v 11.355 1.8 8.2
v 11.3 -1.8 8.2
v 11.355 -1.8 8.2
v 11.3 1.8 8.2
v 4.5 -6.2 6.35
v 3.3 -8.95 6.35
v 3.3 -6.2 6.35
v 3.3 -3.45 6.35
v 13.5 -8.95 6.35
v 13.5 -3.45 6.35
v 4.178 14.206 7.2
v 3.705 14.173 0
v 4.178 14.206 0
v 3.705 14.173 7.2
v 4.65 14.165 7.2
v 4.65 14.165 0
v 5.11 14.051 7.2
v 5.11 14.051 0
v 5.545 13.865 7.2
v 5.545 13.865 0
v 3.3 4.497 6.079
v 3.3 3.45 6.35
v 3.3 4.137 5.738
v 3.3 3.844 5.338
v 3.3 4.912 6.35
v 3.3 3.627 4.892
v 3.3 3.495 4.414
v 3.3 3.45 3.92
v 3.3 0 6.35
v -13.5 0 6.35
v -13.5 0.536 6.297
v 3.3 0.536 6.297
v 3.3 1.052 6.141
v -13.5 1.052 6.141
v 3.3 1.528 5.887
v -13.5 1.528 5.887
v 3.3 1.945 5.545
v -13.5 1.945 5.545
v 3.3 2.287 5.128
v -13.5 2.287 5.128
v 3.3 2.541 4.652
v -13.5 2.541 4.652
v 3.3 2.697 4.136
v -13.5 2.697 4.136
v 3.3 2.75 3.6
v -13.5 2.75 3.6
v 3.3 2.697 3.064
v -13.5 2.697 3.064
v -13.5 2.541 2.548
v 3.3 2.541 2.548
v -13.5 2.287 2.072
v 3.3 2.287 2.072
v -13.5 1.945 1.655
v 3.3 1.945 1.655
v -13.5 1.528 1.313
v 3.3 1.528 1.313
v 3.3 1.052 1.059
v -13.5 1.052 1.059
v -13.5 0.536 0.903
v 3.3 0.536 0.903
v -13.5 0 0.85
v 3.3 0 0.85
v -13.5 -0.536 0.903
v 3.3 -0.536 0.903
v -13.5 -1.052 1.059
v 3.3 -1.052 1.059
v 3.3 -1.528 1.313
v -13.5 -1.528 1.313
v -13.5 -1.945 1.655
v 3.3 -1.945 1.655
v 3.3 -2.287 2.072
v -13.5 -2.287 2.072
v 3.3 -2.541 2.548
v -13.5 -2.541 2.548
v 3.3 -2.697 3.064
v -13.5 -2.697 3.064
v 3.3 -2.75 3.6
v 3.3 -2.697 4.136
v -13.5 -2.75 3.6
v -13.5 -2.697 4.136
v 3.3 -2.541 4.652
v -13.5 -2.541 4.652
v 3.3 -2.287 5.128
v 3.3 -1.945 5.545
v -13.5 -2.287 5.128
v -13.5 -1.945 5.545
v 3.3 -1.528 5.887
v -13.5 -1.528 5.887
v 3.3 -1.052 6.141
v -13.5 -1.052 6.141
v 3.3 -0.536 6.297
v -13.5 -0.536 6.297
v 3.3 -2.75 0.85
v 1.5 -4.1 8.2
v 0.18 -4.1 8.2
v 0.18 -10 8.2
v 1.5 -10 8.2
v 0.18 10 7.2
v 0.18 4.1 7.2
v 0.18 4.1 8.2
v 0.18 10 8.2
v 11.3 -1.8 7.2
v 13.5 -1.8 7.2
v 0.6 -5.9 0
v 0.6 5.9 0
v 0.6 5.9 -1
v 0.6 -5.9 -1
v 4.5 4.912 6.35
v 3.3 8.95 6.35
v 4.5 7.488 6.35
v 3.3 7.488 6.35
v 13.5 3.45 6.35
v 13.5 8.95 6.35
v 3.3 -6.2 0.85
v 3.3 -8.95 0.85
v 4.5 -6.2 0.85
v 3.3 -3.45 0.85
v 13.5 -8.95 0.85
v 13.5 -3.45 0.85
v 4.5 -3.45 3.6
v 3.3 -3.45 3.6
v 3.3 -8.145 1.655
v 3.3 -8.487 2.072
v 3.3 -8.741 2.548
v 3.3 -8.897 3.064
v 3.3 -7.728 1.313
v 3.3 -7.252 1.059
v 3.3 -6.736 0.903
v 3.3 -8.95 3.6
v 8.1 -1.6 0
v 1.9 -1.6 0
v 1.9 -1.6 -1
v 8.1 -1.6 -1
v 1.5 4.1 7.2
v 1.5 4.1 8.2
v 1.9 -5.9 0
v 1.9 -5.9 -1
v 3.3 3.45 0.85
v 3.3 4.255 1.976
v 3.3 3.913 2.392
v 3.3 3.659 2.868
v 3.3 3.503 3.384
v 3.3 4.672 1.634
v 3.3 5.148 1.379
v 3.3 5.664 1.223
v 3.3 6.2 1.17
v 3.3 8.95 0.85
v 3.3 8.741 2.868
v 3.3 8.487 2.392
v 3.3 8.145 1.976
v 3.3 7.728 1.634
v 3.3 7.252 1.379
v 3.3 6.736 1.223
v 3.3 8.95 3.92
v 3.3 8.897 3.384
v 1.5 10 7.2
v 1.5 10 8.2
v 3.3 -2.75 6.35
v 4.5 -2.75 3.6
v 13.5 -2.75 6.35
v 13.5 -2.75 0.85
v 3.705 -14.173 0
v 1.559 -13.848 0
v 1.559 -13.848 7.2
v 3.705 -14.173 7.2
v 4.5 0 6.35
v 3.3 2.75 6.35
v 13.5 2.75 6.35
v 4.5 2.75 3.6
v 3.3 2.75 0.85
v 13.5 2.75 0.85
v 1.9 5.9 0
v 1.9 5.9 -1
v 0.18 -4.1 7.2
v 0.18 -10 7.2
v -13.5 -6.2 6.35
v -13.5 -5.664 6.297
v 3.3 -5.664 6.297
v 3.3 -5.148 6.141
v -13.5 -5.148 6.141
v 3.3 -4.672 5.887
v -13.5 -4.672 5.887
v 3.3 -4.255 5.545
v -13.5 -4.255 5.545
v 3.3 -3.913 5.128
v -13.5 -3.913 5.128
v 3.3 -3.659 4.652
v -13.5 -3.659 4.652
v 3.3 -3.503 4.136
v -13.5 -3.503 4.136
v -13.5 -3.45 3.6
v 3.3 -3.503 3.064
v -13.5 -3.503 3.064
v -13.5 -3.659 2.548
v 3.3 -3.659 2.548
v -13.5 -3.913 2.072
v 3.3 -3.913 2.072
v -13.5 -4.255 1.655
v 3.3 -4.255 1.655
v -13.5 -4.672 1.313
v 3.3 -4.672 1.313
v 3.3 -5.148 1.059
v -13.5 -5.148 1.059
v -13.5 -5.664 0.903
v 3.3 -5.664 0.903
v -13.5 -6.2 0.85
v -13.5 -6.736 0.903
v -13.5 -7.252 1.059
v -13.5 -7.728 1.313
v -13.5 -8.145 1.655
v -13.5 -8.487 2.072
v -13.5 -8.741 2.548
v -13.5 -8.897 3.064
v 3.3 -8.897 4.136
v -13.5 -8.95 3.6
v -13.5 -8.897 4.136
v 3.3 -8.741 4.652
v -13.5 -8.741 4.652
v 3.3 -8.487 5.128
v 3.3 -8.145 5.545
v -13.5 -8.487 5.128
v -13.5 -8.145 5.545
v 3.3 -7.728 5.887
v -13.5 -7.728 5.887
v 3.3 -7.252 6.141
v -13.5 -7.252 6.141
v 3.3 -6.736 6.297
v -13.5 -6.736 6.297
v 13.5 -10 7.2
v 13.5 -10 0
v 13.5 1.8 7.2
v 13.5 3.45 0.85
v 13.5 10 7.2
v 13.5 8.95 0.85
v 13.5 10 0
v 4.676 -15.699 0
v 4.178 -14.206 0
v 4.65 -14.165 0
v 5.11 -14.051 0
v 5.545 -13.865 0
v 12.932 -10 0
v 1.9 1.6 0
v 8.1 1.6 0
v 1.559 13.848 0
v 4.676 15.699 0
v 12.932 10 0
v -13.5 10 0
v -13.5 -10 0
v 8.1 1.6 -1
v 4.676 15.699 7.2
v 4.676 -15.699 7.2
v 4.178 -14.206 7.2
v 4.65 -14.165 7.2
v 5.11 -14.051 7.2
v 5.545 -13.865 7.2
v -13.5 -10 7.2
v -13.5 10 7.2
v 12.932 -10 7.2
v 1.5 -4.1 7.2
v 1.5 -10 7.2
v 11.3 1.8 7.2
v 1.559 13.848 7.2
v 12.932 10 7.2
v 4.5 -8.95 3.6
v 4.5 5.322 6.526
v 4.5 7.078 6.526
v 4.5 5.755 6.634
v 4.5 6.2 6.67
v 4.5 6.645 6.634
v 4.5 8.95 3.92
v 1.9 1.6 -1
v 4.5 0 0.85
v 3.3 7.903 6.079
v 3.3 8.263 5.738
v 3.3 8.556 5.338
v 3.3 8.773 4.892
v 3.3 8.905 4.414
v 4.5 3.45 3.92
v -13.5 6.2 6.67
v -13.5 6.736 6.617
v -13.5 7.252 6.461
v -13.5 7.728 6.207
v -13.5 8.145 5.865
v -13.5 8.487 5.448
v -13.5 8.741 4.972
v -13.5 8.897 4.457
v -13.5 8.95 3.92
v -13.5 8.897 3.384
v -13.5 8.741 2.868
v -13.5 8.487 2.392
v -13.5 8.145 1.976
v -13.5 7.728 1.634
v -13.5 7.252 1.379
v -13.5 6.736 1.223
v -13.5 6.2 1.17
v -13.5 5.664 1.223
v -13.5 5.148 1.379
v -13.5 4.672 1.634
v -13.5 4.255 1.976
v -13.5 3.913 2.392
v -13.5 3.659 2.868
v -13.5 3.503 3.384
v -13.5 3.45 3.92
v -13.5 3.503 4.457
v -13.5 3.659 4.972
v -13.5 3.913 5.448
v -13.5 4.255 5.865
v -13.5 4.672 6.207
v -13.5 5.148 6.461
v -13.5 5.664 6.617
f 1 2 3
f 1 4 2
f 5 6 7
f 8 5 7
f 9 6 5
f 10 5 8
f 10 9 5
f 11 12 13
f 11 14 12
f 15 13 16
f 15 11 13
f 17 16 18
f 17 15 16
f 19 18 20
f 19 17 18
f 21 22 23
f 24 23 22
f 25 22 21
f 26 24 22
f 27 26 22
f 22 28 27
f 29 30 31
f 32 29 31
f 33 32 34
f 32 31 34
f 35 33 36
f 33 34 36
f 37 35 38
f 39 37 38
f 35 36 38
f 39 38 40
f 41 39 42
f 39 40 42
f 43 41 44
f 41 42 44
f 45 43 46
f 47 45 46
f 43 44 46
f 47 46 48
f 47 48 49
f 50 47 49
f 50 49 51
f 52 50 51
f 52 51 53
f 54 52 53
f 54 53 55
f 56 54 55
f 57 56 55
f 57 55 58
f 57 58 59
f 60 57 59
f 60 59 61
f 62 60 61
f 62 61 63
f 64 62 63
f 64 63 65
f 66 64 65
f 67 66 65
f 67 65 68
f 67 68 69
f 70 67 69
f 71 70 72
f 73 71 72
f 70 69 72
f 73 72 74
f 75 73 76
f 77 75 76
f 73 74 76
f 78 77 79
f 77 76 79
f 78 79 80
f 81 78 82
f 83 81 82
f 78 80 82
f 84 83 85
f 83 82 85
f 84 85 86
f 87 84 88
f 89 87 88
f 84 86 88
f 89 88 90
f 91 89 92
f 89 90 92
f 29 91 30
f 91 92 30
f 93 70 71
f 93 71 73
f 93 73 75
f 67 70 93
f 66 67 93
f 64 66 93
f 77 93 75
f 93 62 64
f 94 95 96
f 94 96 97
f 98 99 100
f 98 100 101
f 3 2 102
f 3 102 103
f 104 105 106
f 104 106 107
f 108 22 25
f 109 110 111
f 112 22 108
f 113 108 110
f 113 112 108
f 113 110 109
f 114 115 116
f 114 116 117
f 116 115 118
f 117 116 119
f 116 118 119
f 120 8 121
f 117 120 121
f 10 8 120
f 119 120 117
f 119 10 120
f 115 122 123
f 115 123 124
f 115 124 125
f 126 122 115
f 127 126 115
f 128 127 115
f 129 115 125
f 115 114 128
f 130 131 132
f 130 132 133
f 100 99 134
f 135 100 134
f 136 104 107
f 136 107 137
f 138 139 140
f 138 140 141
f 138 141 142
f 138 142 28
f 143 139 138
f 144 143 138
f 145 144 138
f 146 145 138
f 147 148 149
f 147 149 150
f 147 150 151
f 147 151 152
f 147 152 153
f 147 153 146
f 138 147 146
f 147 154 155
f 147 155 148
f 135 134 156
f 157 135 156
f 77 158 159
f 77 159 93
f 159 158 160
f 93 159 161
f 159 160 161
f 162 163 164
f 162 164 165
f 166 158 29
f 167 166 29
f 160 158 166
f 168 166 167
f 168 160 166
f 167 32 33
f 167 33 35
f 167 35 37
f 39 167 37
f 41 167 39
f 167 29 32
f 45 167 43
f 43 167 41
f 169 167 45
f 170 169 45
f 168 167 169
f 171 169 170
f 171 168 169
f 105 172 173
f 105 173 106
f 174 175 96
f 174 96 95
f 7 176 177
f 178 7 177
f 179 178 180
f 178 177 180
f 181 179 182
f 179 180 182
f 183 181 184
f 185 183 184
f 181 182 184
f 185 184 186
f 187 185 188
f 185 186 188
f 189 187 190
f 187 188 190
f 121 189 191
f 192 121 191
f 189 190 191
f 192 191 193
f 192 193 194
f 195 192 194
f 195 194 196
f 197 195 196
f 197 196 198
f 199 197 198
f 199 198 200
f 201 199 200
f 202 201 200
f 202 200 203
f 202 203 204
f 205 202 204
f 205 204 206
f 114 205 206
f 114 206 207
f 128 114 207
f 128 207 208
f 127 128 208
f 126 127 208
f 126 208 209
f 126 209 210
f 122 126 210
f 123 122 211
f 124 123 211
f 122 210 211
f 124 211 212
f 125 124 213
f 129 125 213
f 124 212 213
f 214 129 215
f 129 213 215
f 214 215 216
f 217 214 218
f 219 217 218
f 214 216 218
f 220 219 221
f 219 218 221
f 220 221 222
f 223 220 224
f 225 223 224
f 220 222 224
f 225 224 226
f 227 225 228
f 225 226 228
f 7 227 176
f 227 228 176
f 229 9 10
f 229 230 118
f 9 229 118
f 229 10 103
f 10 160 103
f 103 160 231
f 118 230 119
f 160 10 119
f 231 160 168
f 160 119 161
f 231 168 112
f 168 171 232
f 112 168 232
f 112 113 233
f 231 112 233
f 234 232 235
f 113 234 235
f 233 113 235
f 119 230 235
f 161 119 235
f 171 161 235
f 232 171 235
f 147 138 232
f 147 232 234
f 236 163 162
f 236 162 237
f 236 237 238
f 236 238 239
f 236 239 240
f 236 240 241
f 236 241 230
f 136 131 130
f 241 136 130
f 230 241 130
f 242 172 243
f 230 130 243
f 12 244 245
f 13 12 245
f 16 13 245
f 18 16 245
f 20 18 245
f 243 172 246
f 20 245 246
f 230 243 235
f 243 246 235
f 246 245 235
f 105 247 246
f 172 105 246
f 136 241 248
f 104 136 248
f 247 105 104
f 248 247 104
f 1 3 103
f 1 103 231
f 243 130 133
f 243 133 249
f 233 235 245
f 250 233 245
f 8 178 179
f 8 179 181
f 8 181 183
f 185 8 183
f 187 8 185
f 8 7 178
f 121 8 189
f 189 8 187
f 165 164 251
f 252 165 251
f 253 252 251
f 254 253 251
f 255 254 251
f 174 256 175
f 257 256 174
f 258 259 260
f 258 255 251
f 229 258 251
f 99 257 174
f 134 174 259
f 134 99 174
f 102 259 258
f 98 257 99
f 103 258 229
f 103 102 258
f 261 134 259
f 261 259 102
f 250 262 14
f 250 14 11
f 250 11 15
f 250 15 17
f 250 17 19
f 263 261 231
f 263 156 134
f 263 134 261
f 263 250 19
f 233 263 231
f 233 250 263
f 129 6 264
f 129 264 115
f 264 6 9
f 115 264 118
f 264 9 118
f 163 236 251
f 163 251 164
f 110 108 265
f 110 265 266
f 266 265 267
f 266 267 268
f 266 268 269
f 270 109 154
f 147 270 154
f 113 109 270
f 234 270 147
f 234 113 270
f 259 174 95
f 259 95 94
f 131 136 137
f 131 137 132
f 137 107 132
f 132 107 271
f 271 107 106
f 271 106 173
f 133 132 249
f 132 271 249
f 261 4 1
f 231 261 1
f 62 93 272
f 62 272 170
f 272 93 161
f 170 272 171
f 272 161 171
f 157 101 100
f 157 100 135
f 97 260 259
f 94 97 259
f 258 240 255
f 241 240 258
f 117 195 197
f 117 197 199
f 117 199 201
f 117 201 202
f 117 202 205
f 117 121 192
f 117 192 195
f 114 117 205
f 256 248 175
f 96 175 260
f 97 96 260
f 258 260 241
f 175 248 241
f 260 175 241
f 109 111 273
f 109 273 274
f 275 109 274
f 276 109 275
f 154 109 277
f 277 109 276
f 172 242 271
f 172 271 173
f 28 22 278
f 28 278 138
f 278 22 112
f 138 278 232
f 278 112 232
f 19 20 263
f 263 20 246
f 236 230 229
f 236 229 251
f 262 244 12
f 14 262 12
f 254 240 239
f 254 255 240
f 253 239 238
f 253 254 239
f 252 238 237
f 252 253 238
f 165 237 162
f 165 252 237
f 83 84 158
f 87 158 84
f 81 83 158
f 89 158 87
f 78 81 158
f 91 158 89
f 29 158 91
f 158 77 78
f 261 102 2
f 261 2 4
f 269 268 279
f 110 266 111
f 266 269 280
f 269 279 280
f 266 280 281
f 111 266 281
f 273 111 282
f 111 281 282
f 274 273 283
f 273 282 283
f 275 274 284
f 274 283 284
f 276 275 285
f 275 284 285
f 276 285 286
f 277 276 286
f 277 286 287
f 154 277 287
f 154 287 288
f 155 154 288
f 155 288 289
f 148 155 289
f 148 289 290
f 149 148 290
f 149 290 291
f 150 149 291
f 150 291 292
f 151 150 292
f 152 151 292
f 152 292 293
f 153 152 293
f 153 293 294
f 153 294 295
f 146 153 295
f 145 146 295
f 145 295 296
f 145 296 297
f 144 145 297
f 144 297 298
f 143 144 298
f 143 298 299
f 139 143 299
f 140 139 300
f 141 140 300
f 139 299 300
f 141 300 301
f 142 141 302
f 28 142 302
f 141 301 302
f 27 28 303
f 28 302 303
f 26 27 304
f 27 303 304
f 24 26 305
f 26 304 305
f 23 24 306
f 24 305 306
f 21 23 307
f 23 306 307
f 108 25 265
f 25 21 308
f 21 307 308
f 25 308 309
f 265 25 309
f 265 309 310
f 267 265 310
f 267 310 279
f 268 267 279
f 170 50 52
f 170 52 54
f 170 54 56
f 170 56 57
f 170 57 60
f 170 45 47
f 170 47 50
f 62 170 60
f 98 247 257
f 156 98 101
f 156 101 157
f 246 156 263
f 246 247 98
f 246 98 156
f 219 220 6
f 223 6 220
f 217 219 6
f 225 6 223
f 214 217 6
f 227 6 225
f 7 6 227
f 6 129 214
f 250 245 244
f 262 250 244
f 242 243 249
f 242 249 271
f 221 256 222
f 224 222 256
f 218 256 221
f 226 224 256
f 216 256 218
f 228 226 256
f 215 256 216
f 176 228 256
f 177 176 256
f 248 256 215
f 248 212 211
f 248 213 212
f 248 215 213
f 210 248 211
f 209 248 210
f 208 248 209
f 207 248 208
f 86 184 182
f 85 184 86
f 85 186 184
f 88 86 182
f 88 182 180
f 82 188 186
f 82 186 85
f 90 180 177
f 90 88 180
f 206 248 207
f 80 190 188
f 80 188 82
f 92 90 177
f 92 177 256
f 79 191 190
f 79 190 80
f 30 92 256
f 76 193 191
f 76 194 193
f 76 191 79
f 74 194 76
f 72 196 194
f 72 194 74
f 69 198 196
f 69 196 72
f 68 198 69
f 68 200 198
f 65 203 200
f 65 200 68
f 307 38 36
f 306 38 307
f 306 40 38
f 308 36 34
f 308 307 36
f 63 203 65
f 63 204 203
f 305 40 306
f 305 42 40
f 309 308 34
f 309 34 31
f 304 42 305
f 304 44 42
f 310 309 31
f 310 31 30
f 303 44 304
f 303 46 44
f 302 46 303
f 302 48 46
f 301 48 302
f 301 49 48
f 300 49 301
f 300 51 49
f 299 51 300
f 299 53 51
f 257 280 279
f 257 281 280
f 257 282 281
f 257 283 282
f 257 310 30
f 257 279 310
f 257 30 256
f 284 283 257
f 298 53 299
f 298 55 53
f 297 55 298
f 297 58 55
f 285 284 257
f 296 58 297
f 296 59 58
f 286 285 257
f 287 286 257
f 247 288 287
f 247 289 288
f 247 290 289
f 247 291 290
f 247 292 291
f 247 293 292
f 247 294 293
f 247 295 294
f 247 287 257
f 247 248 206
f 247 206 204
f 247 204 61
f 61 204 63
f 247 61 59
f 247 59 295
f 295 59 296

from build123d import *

# Parameters (mm, degrees)
SKETCH_1_W          = 27
SKETCH_1_H          = 20
EXTRUDE_1_DEPTH     = 7.2
SKETCH_2_W          = 5.5
SKETCH_2_H          = 5.5
CUT_EXTRUDE_1_DEPTH = 10.2
SKETCH_3_R          = 2.75
CUT_EXTRUDE_2_DEPTH = 18
SKETCH_4_W          = 1.32
SKETCH_4_H          = 5.9
SKETCH_4_W_2        = 2.2
SKETCH_4_H_2        = 3.6
EXTRUDE_2_DEPTH     = 1
CHAMFER_1_SIZE      = 1
CHAMFER_1_SIZE2     = 2.144506921
EXTRUDE_4_DEPTH     = 1
EXTRUDE_5_DEPTH     = 7.2
FILLET_1_R          = 3
FILLET_2_R          = 3


with BuildPart() as part:
    # 草图1 → 凸台-拉伸1 (new body)
    with BuildSketch(Plane.XY):
        Rectangle(SKETCH_1_W, SKETCH_1_H)
    extrude(amount=EXTRUDE_1_DEPTH)

    # 草图2 → 切除-拉伸1 (cut)
    with BuildSketch(Plane(origin=(13.5, 0, 0), x_dir=(0, 0, -1), z_dir=(1, 0, 0))):
        with Locations((-3.6, -6.2)):
            Rectangle(SKETCH_2_W, SKETCH_2_H)
        with Locations((-3.6, 0)):
            Rectangle(SKETCH_2_W, SKETCH_2_H)
        with Locations((-3.6, 6.2)):
            Rectangle(SKETCH_2_W, SKETCH_2_H)
    extrude(amount=-CUT_EXTRUDE_1_DEPTH, mode=Mode.SUBTRACT)

    # 草图3 → 切除-拉伸2 (cut)
    with BuildSketch(Plane.ZY.offset(13.5)):
        with Locations((3.6, 0)):
            Circle(SKETCH_3_R)
        with Locations((3.920071901, 6.2)):
            Circle(SKETCH_3_R)
        with Locations((3.6, -6.2)):
            Circle(SKETCH_3_R)
    extrude(amount=-CUT_EXTRUDE_2_DEPTH, mode=Mode.SUBTRACT)

    # 草图4 → 凸台-拉伸2 (add)
    with BuildSketch(Plane.XY.offset(7.2)):
        with Locations((0.84, 7.05)):
            Rectangle(SKETCH_4_W, SKETCH_4_H)
        with Locations((0.84, -7.05)):
            Rectangle(SKETCH_4_W, SKETCH_4_H)
        with Locations((12.4, 0)):
            Rectangle(SKETCH_4_W_2, SKETCH_4_H_2)
    extrude(amount=EXTRUDE_2_DEPTH)

    # 倒角1
    chamfer_1_edges = [part.edges().sort_by_distance(p)[0] for p in [
        (13.5, 0, 8.2),
    ]]
    chamfer_1_side = [part.faces().sort_by_distance(p)[0] for p in [
        (13.5, -9.78384265, 3.6),
    ]]
    chamfer(chamfer_1_edges, length=CHAMFER_1_SIZE, length2=CHAMFER_1_SIZE2, reference=chamfer_1_side[0])

    # 草图6 → 凸台-拉伸4 (add)
    with BuildSketch(Plane(origin=(0, 0, 0), x_dir=(-1, 0, 0), z_dir=(0, 0, -1))):
        Polygon((-8.1, -1.6), (-8.1, 1.6), (-1.9, 1.6), (-1.9, 5.9), (-0.6, 5.9), (-0.6, -5.9), (-1.9, -5.9), (-1.9, -1.6), align=None)
    extrude(amount=EXTRUDE_4_DEPTH)

    # 草图7 → 凸台-拉伸5 (add)
    with BuildSketch(Plane(origin=(0, 0, 0), x_dir=(-1, 0, 0), z_dir=(0, 0, -1))):
        Polygon((-13.5, 10), (-4.675788996, 15.698556705), (-1.558596332, 13.847723561), (-4.675788996, 14.319689506), (-12.931993779, 10), align=None)
        Polygon((-12.931993779, -10), (-13.5, -10), (-4.675788996, -15.698556705), (-1.558596332, -13.847723561), (-4.675788996, -14.319689506), align=None)
    extrude(amount=-EXTRUDE_5_DEPTH)

    # 圆角1
    fillet_1_edges = [part.edges().sort_by_distance(p)[0] for p in [
        (4.675788996, 14.319689506, 3.6),
    ]]
    fillet(fillet_1_edges, radius=FILLET_1_R)

    # 圆角2
    fillet_2_edges = [part.edges().sort_by_distance(p)[0] for p in [
        (4.675788996, -14.319689506, 3.6),
    ]]
    fillet(fillet_2_edges, radius=FILLET_2_R)


solid = part.part
